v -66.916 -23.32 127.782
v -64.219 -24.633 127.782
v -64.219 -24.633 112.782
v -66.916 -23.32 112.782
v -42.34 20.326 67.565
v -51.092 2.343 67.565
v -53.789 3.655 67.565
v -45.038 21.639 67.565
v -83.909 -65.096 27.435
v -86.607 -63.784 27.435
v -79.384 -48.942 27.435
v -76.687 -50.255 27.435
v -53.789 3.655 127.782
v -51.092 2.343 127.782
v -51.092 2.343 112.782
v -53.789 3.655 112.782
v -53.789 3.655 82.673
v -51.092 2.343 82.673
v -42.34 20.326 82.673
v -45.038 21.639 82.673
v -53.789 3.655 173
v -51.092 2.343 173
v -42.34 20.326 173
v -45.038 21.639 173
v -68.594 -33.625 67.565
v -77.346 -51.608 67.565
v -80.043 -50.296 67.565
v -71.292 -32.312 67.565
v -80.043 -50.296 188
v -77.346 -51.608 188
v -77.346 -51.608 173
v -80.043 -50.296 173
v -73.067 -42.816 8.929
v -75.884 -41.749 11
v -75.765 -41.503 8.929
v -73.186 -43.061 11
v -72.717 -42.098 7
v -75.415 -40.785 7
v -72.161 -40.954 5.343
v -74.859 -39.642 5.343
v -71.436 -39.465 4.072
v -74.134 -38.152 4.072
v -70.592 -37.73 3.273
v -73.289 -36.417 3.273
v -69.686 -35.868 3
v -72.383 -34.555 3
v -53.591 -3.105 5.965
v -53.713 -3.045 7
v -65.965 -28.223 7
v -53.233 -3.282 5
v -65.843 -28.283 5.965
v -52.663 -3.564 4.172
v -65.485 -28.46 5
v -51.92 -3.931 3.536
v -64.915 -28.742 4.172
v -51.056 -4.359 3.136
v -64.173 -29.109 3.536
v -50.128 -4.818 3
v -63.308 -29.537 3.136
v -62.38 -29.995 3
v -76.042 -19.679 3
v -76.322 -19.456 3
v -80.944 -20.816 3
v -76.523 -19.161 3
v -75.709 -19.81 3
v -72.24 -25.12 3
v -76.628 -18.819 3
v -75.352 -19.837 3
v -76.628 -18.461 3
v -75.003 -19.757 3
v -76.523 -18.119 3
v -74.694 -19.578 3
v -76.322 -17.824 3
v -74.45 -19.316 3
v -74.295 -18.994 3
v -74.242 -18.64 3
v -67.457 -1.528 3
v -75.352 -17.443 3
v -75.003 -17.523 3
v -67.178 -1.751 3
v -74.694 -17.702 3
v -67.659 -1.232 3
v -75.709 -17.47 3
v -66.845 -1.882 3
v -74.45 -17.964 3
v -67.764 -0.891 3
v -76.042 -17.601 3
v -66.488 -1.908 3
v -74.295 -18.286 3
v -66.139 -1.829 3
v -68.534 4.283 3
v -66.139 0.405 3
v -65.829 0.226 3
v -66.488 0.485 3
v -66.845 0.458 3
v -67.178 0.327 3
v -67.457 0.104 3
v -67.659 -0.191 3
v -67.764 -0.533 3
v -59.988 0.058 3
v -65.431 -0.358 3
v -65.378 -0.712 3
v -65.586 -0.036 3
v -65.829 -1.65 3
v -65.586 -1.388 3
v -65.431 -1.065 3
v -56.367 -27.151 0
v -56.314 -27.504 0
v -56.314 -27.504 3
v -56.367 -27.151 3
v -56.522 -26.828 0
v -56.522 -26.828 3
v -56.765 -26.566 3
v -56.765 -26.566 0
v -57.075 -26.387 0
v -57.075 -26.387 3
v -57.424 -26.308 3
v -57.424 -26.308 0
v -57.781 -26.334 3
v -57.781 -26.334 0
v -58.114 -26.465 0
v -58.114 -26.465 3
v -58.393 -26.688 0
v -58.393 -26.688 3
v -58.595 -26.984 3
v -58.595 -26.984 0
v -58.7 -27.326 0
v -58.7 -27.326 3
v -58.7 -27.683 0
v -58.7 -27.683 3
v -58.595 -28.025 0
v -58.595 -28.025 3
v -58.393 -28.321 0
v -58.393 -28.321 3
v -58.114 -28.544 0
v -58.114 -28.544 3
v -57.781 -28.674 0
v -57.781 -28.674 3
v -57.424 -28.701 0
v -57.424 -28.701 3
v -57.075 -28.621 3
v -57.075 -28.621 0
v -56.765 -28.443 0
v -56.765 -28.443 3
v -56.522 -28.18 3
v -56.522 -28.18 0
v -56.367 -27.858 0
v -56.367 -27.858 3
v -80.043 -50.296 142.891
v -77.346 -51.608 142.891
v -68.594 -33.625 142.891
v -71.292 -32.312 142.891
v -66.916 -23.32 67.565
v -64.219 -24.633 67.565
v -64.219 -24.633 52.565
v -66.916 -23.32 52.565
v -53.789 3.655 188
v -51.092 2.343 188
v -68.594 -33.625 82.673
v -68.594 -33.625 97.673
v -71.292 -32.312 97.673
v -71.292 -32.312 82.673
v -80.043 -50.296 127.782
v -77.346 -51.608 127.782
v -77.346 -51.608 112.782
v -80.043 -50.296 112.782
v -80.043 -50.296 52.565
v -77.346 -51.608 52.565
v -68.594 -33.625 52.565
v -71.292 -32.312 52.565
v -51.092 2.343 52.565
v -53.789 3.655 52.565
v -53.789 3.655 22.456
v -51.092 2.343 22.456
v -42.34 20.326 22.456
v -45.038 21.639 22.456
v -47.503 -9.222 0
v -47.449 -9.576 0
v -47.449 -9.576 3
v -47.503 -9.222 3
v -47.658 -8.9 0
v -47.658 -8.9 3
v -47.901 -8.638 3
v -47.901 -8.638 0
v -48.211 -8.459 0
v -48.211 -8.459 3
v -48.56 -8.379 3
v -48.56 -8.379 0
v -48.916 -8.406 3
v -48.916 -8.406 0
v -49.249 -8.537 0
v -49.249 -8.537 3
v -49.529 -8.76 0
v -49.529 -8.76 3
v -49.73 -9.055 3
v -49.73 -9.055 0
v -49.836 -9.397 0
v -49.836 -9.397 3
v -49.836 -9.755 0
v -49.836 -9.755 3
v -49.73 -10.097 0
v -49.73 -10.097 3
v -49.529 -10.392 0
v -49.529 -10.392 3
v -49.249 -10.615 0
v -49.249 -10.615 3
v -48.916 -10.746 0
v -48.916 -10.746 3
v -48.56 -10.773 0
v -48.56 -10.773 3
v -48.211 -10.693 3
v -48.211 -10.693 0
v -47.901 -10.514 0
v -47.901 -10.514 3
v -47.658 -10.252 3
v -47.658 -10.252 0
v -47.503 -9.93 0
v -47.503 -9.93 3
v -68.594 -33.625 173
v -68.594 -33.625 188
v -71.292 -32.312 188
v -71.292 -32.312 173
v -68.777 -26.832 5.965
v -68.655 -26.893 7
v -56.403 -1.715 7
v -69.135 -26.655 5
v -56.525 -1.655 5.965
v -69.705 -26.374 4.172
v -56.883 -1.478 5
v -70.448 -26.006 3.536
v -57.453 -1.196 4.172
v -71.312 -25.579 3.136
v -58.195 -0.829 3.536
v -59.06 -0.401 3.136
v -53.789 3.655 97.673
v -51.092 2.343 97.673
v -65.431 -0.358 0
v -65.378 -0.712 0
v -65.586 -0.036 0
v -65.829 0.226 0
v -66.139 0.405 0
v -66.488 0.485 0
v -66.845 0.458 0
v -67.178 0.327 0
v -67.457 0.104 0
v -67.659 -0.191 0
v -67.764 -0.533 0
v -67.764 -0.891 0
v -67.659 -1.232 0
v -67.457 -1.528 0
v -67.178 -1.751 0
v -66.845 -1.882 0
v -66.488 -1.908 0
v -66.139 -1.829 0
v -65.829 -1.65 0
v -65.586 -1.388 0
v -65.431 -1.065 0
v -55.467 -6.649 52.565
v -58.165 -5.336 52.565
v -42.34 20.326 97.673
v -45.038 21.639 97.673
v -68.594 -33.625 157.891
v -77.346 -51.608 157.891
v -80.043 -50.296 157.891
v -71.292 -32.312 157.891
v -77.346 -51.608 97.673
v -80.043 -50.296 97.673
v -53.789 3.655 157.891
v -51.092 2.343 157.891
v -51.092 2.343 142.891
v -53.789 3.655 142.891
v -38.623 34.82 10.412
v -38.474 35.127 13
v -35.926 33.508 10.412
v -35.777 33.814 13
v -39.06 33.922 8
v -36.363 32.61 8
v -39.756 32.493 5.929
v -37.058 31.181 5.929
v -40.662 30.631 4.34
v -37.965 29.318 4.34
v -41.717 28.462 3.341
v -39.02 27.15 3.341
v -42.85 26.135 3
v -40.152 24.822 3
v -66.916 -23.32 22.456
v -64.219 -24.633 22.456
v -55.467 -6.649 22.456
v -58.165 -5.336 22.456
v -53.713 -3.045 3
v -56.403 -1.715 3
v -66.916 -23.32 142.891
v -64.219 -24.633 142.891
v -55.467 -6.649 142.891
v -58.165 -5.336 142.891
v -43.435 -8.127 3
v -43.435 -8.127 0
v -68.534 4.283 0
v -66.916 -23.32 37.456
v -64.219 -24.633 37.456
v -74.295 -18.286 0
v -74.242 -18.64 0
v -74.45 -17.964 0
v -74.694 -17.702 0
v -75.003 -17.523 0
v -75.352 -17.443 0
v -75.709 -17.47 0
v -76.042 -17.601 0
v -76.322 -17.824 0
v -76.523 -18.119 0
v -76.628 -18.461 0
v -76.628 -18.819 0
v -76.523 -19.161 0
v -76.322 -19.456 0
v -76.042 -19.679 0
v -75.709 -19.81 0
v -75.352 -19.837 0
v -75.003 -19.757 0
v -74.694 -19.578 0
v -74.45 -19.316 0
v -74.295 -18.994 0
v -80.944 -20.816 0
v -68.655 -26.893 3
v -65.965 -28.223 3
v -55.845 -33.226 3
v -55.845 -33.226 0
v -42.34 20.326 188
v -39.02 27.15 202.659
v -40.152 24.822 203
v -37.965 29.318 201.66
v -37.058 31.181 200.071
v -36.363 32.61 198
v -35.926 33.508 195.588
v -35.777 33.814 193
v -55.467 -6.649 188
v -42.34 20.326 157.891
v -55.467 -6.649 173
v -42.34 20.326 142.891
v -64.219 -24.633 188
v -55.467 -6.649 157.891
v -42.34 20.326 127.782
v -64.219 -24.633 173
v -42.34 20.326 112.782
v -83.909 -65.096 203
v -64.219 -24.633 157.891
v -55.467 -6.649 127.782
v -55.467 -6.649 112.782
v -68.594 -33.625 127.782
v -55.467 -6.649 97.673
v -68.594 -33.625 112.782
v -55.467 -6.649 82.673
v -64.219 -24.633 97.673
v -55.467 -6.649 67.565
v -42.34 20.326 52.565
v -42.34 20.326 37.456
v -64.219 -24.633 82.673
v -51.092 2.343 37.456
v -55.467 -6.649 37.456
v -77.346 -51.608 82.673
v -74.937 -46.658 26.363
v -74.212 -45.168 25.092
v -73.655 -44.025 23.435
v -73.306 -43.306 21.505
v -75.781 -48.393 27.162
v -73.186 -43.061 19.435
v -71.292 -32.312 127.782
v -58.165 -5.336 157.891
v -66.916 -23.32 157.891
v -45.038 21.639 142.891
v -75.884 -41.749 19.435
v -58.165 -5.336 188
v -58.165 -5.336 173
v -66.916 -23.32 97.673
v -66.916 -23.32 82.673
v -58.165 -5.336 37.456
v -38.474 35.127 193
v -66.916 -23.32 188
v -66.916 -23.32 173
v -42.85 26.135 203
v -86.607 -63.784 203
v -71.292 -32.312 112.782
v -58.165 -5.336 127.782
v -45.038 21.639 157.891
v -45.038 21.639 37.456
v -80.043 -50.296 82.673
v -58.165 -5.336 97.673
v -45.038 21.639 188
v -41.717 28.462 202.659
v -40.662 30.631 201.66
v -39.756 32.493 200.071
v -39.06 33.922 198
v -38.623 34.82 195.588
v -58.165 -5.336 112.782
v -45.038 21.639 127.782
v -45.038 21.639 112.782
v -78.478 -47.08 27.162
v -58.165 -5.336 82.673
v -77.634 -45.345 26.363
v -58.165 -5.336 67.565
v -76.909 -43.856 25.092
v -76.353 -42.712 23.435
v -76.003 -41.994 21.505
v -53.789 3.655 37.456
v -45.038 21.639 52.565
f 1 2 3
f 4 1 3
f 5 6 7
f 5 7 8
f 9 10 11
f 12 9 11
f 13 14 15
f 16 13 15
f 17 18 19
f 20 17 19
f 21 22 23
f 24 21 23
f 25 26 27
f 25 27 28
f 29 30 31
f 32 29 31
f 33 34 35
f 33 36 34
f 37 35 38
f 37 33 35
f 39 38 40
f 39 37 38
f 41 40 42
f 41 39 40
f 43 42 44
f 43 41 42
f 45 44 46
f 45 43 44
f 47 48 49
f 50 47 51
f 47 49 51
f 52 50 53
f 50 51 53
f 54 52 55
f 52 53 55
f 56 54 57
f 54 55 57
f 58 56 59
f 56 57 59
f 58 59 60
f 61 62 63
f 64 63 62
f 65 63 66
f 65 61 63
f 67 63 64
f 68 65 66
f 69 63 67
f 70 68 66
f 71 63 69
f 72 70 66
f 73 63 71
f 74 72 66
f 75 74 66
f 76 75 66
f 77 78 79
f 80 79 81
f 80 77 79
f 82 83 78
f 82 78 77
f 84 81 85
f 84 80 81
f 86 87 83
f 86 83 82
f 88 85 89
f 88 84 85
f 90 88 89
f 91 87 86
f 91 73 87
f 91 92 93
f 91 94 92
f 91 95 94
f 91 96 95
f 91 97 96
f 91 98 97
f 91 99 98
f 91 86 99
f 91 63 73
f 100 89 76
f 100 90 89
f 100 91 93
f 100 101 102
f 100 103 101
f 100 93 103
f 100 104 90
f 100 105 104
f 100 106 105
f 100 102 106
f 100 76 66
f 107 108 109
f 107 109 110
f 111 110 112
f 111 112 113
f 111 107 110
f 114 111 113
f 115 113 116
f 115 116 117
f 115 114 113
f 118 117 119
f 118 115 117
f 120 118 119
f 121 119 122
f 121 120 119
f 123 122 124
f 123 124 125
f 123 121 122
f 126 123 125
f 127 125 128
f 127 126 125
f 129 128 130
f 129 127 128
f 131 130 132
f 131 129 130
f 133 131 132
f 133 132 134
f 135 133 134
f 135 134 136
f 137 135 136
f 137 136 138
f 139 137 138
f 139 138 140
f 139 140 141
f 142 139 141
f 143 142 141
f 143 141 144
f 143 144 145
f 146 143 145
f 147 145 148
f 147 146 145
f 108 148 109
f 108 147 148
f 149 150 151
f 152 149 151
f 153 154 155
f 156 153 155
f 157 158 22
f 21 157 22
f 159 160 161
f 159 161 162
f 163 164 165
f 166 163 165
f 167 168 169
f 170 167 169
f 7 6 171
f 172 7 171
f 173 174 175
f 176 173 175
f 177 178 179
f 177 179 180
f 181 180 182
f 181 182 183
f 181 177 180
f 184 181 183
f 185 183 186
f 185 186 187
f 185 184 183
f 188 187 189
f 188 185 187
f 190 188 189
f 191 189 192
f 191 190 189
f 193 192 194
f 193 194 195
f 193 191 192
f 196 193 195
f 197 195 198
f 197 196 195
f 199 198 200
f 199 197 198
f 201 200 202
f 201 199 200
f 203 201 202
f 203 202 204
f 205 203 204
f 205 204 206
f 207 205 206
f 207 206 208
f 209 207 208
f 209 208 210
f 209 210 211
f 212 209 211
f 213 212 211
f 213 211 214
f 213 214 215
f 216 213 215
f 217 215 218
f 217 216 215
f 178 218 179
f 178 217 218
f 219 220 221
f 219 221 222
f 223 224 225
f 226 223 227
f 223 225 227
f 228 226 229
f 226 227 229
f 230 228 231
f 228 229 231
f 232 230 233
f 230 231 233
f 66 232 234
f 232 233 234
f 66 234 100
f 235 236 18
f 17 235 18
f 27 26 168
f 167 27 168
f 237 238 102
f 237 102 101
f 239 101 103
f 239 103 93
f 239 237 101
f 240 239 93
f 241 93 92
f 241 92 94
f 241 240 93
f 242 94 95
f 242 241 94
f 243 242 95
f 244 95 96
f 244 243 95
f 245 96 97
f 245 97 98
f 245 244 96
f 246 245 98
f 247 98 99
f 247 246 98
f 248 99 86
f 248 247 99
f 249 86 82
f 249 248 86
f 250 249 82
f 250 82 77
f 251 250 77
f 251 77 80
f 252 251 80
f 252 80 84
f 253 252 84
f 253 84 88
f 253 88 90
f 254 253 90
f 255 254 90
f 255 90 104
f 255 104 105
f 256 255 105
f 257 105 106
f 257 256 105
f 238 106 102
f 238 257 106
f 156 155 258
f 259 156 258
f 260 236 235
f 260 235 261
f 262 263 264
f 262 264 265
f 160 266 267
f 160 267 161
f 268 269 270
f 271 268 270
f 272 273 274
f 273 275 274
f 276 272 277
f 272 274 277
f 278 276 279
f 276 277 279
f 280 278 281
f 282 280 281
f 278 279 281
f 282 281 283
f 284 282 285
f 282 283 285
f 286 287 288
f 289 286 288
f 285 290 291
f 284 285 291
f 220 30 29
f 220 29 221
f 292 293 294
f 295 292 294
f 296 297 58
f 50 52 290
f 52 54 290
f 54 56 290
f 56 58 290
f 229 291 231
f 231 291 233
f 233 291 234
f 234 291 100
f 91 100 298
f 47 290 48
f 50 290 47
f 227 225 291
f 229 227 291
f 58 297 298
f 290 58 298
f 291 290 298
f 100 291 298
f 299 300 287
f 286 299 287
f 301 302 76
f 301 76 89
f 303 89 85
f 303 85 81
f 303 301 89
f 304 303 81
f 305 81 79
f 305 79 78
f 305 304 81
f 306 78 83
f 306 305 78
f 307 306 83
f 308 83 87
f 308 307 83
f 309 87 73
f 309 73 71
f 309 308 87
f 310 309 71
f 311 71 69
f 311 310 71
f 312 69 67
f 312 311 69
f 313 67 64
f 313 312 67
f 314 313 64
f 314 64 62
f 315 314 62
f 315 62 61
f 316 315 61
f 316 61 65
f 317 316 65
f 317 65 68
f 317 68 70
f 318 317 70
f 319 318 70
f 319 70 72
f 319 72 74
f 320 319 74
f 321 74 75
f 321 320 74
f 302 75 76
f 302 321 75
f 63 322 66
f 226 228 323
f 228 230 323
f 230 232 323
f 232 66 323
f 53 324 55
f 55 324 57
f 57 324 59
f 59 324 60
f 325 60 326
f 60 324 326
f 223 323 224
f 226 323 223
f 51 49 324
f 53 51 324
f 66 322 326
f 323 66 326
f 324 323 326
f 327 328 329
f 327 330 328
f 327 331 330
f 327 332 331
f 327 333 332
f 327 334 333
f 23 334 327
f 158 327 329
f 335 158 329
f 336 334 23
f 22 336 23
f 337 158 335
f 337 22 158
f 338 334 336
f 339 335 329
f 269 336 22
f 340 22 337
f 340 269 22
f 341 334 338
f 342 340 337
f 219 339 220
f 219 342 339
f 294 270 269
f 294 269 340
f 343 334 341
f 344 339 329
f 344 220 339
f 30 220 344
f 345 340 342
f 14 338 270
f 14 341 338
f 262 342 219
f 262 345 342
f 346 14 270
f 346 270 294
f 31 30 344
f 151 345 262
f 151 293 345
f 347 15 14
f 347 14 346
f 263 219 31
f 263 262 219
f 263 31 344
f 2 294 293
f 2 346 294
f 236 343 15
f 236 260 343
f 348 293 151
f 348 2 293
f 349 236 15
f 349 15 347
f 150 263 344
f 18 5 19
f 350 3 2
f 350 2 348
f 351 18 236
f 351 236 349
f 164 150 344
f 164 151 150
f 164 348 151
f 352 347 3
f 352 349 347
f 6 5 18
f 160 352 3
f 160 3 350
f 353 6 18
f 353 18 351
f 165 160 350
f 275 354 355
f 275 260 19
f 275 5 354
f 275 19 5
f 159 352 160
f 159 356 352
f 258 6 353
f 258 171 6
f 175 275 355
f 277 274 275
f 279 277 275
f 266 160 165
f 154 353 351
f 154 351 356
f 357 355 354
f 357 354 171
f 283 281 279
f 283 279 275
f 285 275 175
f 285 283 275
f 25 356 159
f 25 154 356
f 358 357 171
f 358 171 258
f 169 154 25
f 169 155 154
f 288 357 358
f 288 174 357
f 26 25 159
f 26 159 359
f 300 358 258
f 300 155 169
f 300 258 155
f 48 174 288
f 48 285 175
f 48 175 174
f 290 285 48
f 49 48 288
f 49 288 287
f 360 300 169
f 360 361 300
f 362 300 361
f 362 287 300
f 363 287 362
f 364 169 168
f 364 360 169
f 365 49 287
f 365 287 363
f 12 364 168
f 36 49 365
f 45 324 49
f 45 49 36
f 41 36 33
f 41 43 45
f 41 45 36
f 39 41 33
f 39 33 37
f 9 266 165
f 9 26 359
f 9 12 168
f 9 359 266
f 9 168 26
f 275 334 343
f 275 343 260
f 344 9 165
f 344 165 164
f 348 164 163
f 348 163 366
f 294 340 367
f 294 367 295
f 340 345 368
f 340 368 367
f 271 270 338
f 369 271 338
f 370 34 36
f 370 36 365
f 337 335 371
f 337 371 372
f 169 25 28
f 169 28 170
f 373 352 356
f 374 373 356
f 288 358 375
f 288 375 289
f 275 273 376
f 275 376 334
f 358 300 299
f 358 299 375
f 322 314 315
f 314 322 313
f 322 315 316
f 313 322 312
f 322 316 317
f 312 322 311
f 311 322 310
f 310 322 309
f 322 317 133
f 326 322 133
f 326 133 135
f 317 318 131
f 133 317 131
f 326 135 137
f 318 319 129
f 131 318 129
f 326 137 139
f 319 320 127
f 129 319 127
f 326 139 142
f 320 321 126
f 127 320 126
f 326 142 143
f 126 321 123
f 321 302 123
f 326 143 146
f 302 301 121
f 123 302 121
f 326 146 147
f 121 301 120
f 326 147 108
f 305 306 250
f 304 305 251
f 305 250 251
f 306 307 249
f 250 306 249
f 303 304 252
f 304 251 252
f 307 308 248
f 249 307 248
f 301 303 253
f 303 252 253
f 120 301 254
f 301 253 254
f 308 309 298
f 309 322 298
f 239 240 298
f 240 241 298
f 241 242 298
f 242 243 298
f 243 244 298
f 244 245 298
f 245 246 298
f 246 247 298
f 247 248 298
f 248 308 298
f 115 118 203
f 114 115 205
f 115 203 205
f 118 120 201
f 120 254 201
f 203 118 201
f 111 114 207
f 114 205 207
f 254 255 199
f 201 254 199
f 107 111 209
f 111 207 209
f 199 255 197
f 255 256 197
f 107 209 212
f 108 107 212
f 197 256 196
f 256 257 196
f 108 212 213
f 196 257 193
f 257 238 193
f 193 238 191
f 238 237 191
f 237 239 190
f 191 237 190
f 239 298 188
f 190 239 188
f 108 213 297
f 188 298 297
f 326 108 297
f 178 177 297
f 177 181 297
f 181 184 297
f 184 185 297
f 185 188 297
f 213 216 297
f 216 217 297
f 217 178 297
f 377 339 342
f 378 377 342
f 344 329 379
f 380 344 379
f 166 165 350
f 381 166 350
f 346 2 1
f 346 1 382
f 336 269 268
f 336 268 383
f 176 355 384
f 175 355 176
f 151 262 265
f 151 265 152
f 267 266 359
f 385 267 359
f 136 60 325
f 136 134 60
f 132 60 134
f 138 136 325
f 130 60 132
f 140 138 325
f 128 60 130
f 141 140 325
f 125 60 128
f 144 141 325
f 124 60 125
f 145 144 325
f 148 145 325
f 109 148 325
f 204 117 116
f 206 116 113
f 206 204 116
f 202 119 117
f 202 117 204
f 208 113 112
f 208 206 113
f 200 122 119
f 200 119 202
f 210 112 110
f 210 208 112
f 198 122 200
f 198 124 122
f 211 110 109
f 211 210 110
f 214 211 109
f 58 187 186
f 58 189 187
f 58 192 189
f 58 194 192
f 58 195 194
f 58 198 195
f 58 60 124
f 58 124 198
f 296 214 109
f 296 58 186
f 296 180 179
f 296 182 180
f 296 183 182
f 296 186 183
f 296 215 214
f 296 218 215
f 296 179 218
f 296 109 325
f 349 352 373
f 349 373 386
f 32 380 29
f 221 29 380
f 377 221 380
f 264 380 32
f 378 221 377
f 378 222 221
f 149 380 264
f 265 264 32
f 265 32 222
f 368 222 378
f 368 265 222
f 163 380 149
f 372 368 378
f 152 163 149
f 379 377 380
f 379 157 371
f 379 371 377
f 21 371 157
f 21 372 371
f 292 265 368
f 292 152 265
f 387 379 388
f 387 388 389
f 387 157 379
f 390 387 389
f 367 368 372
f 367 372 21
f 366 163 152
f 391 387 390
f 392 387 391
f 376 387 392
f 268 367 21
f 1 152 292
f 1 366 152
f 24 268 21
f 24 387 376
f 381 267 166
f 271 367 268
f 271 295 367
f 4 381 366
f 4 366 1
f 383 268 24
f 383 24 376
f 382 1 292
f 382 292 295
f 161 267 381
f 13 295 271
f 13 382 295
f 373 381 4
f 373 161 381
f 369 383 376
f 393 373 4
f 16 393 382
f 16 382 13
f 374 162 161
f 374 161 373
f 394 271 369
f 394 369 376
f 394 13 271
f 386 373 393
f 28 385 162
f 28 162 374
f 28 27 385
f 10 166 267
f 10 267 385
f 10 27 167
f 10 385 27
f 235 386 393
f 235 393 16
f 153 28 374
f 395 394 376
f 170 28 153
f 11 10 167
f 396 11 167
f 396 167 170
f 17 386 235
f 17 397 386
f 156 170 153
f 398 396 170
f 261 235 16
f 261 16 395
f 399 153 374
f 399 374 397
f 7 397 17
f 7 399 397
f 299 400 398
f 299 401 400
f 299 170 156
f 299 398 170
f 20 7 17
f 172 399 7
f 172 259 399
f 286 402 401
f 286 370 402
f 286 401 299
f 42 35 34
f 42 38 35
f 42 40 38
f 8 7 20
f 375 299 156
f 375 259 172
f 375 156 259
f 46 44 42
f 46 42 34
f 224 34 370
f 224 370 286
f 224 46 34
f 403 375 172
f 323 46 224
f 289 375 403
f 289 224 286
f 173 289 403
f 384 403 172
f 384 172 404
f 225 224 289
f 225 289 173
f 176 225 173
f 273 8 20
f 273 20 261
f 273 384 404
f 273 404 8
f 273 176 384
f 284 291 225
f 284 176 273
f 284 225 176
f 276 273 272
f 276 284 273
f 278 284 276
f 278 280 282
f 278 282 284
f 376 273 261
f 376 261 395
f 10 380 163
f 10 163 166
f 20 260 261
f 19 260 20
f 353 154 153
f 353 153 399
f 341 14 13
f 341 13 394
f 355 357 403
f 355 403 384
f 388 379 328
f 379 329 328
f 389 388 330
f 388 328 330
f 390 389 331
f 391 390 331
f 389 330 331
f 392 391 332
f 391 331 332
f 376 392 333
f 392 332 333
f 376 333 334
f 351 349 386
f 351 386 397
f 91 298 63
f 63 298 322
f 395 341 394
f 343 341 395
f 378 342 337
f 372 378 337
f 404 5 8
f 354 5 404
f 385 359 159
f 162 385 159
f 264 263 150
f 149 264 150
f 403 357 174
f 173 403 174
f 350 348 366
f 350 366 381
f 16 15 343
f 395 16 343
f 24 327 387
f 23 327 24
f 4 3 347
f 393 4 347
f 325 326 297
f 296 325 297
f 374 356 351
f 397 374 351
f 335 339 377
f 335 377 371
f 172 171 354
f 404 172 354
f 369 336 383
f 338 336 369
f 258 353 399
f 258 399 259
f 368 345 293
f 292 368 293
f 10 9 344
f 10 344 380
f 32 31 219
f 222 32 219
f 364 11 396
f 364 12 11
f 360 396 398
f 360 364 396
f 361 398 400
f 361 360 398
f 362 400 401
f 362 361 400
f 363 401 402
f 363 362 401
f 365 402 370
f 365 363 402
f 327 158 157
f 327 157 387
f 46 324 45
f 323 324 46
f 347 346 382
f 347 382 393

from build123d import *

# Parameters (mm, degrees)
SKETCH_1_R          = 1.2
EXTRUDE_1_DEPTH     = 3
EXTRUDE_2_DEPTH     = 200
FILLET_1_R          = 4
SKETCH_4_W          = 24.434656606
SKETCH_4_H          = 24.505426632
CUT_EXTRUDE_1_DEPTH = 4
FILLET_3_R          = 8
SKETCH_5_W          = 15
SKETCH_5_H          = 20
CUT_EXTRUDE_2_DEPTH = 10
FILLET_4_R          = 10
FILLET_5_R          = 10


with BuildPart() as part:
    # 草图1 → 凸台-拉伸1 (new body)
    with BuildSketch(Plane.XY):
        Polygon((-68.534318099, 4.283164377), (-80.94435421, -20.816457208), (-55.844732625, -33.22649332), (-43.434696514, -8.126871734), align=None)
        with Locations((-66.577549394, -0.711768645)):
            Circle(SKETCH_1_R, mode=Mode.SUBTRACT)
        with Locations((-75.441860902, -18.640069777)):
            Circle(SKETCH_1_R, mode=Mode.SUBTRACT)
        with Locations((-57.51355977, -27.504381286)):
            Circle(SKETCH_1_R, mode=Mode.SUBTRACT)
        with Locations((-48.649248262, -9.576080153)):
            Circle(SKETCH_1_R, mode=Mode.SUBTRACT)
    extrude(amount=EXTRUDE_1_DEPTH)

    # 草图2 → 凸台-拉伸2 (add)
    with BuildSketch(Plane.XY.offset(3)):
        Polygon((-86.606649797, -63.783530386), (-38.474241258, 35.126889936), (-35.77668434, 33.814187885), (-83.909092879, -65.096232437), align=None)
    extrude(amount=EXTRUDE_2_DEPTH)

    # 圆角1
    fillet_1_edges = [part.edges().sort_by_distance(p)[0] for p in [
        (-59.839316246, -15.633681193, 3),
        (-62.528614635, -14.304008154, 3),
    ]]
    fillet(fillet_1_edges, radius=FILLET_1_R)

    # 草图4 → 切除-拉伸1 (cut)
    with BuildSketch(Plane(origin=(-44.928588602, 21.863431321, 0), x_dir=(0, 0, 1), z_dir=(-0.8991856392880848, 0.43756735035658034, 0))):
        with Locations((15.217328303, -82.996763505)):
            Rectangle(SKETCH_4_W, SKETCH_4_H)
    extrude(amount=-CUT_EXTRUDE_1_DEPTH, mode=Mode.SUBTRACT)

    # 圆角3
    fillet_3_edges = [part.edges().sort_by_distance(p)[0] for p in [
        (-74.535096738, -42.4049537, 3),
        (-74.535096738, -42.4049537, 27.434656606),
    ]]
    fillet(fillet_3_edges, radius=FILLET_3_R)

    # 草图5 → 切除-拉伸2 (cut)
    with BuildSketch(Plane(origin=(-42.231031684, 20.55072927, 0), x_dir=(0, 0, -1), z_dir=(0.8991856392880848, -0.4375673503565804, 0))):
        with Locations((-60.064574797, -10.249476821)):
            Rectangle(SKETCH_5_W, SKETCH_5_H)
        with Locations((-29.955718497, -10.249476821)):
            Rectangle(SKETCH_5_W, SKETCH_5_H)
        with Locations((-90.173431098, -10.249476821)):
            Rectangle(SKETCH_5_W, SKETCH_5_H)
        with Locations((-120.282287399, -10.249476821)):
            Rectangle(SKETCH_5_W, SKETCH_5_H)
        with Locations((-150.391143699, -10.249476821)):
            Rectangle(SKETCH_5_W, SKETCH_5_H)
        with Locations((-180.5, -10.249476821)):
            Rectangle(SKETCH_5_W, SKETCH_5_H)
        with Locations((-60.064574797, -40.249476821)):
            Rectangle(SKETCH_5_W, SKETCH_5_H)
        with Locations((-90.173431098, -40.249476821)):
            Rectangle(SKETCH_5_W, SKETCH_5_H)
        with Locations((-120.282287399, -40.249476821)):
            Rectangle(SKETCH_5_W, SKETCH_5_H)
        with Locations((-150.391143699, -40.249476821)):
            Rectangle(SKETCH_5_W, SKETCH_5_H)
        with Locations((-180.5, -40.249476821)):
            Rectangle(SKETCH_5_W, SKETCH_5_H)
        with Locations((-60.064574797, -70.249476821)):
            Rectangle(SKETCH_5_W, SKETCH_5_H)
        with Locations((-90.173431098, -70.249476821)):
            Rectangle(SKETCH_5_W, SKETCH_5_H)
        with Locations((-120.282287399, -70.249476821)):
            Rectangle(SKETCH_5_W, SKETCH_5_H)
        with Locations((-150.391143699, -70.249476821)):
            Rectangle(SKETCH_5_W, SKETCH_5_H)
        with Locations((-180.5, -70.249476821)):
            Rectangle(SKETCH_5_W, SKETCH_5_H)
        with Locations((-29.955718497, -40.249476821)):
            Rectangle(SKETCH_5_W, SKETCH_5_H)
    extrude(amount=-CUT_EXTRUDE_2_DEPTH, mode=Mode.SUBTRACT)

    # 圆角4
    fillet_4_edges = [part.edges().sort_by_distance(p)[0] for p in [
        (-37.125462799, 34.470538911, 203),
    ]]
    fillet(fillet_4_edges, radius=FILLET_4_R)

    # 圆角5
    fillet_5_edges = [part.edges().sort_by_distance(p)[0] for p in [
        (-37.125462799, 34.470538911, 3),
    ]]
    fillet(fillet_5_edges, radius=FILLET_5_R)


solid = part.part
